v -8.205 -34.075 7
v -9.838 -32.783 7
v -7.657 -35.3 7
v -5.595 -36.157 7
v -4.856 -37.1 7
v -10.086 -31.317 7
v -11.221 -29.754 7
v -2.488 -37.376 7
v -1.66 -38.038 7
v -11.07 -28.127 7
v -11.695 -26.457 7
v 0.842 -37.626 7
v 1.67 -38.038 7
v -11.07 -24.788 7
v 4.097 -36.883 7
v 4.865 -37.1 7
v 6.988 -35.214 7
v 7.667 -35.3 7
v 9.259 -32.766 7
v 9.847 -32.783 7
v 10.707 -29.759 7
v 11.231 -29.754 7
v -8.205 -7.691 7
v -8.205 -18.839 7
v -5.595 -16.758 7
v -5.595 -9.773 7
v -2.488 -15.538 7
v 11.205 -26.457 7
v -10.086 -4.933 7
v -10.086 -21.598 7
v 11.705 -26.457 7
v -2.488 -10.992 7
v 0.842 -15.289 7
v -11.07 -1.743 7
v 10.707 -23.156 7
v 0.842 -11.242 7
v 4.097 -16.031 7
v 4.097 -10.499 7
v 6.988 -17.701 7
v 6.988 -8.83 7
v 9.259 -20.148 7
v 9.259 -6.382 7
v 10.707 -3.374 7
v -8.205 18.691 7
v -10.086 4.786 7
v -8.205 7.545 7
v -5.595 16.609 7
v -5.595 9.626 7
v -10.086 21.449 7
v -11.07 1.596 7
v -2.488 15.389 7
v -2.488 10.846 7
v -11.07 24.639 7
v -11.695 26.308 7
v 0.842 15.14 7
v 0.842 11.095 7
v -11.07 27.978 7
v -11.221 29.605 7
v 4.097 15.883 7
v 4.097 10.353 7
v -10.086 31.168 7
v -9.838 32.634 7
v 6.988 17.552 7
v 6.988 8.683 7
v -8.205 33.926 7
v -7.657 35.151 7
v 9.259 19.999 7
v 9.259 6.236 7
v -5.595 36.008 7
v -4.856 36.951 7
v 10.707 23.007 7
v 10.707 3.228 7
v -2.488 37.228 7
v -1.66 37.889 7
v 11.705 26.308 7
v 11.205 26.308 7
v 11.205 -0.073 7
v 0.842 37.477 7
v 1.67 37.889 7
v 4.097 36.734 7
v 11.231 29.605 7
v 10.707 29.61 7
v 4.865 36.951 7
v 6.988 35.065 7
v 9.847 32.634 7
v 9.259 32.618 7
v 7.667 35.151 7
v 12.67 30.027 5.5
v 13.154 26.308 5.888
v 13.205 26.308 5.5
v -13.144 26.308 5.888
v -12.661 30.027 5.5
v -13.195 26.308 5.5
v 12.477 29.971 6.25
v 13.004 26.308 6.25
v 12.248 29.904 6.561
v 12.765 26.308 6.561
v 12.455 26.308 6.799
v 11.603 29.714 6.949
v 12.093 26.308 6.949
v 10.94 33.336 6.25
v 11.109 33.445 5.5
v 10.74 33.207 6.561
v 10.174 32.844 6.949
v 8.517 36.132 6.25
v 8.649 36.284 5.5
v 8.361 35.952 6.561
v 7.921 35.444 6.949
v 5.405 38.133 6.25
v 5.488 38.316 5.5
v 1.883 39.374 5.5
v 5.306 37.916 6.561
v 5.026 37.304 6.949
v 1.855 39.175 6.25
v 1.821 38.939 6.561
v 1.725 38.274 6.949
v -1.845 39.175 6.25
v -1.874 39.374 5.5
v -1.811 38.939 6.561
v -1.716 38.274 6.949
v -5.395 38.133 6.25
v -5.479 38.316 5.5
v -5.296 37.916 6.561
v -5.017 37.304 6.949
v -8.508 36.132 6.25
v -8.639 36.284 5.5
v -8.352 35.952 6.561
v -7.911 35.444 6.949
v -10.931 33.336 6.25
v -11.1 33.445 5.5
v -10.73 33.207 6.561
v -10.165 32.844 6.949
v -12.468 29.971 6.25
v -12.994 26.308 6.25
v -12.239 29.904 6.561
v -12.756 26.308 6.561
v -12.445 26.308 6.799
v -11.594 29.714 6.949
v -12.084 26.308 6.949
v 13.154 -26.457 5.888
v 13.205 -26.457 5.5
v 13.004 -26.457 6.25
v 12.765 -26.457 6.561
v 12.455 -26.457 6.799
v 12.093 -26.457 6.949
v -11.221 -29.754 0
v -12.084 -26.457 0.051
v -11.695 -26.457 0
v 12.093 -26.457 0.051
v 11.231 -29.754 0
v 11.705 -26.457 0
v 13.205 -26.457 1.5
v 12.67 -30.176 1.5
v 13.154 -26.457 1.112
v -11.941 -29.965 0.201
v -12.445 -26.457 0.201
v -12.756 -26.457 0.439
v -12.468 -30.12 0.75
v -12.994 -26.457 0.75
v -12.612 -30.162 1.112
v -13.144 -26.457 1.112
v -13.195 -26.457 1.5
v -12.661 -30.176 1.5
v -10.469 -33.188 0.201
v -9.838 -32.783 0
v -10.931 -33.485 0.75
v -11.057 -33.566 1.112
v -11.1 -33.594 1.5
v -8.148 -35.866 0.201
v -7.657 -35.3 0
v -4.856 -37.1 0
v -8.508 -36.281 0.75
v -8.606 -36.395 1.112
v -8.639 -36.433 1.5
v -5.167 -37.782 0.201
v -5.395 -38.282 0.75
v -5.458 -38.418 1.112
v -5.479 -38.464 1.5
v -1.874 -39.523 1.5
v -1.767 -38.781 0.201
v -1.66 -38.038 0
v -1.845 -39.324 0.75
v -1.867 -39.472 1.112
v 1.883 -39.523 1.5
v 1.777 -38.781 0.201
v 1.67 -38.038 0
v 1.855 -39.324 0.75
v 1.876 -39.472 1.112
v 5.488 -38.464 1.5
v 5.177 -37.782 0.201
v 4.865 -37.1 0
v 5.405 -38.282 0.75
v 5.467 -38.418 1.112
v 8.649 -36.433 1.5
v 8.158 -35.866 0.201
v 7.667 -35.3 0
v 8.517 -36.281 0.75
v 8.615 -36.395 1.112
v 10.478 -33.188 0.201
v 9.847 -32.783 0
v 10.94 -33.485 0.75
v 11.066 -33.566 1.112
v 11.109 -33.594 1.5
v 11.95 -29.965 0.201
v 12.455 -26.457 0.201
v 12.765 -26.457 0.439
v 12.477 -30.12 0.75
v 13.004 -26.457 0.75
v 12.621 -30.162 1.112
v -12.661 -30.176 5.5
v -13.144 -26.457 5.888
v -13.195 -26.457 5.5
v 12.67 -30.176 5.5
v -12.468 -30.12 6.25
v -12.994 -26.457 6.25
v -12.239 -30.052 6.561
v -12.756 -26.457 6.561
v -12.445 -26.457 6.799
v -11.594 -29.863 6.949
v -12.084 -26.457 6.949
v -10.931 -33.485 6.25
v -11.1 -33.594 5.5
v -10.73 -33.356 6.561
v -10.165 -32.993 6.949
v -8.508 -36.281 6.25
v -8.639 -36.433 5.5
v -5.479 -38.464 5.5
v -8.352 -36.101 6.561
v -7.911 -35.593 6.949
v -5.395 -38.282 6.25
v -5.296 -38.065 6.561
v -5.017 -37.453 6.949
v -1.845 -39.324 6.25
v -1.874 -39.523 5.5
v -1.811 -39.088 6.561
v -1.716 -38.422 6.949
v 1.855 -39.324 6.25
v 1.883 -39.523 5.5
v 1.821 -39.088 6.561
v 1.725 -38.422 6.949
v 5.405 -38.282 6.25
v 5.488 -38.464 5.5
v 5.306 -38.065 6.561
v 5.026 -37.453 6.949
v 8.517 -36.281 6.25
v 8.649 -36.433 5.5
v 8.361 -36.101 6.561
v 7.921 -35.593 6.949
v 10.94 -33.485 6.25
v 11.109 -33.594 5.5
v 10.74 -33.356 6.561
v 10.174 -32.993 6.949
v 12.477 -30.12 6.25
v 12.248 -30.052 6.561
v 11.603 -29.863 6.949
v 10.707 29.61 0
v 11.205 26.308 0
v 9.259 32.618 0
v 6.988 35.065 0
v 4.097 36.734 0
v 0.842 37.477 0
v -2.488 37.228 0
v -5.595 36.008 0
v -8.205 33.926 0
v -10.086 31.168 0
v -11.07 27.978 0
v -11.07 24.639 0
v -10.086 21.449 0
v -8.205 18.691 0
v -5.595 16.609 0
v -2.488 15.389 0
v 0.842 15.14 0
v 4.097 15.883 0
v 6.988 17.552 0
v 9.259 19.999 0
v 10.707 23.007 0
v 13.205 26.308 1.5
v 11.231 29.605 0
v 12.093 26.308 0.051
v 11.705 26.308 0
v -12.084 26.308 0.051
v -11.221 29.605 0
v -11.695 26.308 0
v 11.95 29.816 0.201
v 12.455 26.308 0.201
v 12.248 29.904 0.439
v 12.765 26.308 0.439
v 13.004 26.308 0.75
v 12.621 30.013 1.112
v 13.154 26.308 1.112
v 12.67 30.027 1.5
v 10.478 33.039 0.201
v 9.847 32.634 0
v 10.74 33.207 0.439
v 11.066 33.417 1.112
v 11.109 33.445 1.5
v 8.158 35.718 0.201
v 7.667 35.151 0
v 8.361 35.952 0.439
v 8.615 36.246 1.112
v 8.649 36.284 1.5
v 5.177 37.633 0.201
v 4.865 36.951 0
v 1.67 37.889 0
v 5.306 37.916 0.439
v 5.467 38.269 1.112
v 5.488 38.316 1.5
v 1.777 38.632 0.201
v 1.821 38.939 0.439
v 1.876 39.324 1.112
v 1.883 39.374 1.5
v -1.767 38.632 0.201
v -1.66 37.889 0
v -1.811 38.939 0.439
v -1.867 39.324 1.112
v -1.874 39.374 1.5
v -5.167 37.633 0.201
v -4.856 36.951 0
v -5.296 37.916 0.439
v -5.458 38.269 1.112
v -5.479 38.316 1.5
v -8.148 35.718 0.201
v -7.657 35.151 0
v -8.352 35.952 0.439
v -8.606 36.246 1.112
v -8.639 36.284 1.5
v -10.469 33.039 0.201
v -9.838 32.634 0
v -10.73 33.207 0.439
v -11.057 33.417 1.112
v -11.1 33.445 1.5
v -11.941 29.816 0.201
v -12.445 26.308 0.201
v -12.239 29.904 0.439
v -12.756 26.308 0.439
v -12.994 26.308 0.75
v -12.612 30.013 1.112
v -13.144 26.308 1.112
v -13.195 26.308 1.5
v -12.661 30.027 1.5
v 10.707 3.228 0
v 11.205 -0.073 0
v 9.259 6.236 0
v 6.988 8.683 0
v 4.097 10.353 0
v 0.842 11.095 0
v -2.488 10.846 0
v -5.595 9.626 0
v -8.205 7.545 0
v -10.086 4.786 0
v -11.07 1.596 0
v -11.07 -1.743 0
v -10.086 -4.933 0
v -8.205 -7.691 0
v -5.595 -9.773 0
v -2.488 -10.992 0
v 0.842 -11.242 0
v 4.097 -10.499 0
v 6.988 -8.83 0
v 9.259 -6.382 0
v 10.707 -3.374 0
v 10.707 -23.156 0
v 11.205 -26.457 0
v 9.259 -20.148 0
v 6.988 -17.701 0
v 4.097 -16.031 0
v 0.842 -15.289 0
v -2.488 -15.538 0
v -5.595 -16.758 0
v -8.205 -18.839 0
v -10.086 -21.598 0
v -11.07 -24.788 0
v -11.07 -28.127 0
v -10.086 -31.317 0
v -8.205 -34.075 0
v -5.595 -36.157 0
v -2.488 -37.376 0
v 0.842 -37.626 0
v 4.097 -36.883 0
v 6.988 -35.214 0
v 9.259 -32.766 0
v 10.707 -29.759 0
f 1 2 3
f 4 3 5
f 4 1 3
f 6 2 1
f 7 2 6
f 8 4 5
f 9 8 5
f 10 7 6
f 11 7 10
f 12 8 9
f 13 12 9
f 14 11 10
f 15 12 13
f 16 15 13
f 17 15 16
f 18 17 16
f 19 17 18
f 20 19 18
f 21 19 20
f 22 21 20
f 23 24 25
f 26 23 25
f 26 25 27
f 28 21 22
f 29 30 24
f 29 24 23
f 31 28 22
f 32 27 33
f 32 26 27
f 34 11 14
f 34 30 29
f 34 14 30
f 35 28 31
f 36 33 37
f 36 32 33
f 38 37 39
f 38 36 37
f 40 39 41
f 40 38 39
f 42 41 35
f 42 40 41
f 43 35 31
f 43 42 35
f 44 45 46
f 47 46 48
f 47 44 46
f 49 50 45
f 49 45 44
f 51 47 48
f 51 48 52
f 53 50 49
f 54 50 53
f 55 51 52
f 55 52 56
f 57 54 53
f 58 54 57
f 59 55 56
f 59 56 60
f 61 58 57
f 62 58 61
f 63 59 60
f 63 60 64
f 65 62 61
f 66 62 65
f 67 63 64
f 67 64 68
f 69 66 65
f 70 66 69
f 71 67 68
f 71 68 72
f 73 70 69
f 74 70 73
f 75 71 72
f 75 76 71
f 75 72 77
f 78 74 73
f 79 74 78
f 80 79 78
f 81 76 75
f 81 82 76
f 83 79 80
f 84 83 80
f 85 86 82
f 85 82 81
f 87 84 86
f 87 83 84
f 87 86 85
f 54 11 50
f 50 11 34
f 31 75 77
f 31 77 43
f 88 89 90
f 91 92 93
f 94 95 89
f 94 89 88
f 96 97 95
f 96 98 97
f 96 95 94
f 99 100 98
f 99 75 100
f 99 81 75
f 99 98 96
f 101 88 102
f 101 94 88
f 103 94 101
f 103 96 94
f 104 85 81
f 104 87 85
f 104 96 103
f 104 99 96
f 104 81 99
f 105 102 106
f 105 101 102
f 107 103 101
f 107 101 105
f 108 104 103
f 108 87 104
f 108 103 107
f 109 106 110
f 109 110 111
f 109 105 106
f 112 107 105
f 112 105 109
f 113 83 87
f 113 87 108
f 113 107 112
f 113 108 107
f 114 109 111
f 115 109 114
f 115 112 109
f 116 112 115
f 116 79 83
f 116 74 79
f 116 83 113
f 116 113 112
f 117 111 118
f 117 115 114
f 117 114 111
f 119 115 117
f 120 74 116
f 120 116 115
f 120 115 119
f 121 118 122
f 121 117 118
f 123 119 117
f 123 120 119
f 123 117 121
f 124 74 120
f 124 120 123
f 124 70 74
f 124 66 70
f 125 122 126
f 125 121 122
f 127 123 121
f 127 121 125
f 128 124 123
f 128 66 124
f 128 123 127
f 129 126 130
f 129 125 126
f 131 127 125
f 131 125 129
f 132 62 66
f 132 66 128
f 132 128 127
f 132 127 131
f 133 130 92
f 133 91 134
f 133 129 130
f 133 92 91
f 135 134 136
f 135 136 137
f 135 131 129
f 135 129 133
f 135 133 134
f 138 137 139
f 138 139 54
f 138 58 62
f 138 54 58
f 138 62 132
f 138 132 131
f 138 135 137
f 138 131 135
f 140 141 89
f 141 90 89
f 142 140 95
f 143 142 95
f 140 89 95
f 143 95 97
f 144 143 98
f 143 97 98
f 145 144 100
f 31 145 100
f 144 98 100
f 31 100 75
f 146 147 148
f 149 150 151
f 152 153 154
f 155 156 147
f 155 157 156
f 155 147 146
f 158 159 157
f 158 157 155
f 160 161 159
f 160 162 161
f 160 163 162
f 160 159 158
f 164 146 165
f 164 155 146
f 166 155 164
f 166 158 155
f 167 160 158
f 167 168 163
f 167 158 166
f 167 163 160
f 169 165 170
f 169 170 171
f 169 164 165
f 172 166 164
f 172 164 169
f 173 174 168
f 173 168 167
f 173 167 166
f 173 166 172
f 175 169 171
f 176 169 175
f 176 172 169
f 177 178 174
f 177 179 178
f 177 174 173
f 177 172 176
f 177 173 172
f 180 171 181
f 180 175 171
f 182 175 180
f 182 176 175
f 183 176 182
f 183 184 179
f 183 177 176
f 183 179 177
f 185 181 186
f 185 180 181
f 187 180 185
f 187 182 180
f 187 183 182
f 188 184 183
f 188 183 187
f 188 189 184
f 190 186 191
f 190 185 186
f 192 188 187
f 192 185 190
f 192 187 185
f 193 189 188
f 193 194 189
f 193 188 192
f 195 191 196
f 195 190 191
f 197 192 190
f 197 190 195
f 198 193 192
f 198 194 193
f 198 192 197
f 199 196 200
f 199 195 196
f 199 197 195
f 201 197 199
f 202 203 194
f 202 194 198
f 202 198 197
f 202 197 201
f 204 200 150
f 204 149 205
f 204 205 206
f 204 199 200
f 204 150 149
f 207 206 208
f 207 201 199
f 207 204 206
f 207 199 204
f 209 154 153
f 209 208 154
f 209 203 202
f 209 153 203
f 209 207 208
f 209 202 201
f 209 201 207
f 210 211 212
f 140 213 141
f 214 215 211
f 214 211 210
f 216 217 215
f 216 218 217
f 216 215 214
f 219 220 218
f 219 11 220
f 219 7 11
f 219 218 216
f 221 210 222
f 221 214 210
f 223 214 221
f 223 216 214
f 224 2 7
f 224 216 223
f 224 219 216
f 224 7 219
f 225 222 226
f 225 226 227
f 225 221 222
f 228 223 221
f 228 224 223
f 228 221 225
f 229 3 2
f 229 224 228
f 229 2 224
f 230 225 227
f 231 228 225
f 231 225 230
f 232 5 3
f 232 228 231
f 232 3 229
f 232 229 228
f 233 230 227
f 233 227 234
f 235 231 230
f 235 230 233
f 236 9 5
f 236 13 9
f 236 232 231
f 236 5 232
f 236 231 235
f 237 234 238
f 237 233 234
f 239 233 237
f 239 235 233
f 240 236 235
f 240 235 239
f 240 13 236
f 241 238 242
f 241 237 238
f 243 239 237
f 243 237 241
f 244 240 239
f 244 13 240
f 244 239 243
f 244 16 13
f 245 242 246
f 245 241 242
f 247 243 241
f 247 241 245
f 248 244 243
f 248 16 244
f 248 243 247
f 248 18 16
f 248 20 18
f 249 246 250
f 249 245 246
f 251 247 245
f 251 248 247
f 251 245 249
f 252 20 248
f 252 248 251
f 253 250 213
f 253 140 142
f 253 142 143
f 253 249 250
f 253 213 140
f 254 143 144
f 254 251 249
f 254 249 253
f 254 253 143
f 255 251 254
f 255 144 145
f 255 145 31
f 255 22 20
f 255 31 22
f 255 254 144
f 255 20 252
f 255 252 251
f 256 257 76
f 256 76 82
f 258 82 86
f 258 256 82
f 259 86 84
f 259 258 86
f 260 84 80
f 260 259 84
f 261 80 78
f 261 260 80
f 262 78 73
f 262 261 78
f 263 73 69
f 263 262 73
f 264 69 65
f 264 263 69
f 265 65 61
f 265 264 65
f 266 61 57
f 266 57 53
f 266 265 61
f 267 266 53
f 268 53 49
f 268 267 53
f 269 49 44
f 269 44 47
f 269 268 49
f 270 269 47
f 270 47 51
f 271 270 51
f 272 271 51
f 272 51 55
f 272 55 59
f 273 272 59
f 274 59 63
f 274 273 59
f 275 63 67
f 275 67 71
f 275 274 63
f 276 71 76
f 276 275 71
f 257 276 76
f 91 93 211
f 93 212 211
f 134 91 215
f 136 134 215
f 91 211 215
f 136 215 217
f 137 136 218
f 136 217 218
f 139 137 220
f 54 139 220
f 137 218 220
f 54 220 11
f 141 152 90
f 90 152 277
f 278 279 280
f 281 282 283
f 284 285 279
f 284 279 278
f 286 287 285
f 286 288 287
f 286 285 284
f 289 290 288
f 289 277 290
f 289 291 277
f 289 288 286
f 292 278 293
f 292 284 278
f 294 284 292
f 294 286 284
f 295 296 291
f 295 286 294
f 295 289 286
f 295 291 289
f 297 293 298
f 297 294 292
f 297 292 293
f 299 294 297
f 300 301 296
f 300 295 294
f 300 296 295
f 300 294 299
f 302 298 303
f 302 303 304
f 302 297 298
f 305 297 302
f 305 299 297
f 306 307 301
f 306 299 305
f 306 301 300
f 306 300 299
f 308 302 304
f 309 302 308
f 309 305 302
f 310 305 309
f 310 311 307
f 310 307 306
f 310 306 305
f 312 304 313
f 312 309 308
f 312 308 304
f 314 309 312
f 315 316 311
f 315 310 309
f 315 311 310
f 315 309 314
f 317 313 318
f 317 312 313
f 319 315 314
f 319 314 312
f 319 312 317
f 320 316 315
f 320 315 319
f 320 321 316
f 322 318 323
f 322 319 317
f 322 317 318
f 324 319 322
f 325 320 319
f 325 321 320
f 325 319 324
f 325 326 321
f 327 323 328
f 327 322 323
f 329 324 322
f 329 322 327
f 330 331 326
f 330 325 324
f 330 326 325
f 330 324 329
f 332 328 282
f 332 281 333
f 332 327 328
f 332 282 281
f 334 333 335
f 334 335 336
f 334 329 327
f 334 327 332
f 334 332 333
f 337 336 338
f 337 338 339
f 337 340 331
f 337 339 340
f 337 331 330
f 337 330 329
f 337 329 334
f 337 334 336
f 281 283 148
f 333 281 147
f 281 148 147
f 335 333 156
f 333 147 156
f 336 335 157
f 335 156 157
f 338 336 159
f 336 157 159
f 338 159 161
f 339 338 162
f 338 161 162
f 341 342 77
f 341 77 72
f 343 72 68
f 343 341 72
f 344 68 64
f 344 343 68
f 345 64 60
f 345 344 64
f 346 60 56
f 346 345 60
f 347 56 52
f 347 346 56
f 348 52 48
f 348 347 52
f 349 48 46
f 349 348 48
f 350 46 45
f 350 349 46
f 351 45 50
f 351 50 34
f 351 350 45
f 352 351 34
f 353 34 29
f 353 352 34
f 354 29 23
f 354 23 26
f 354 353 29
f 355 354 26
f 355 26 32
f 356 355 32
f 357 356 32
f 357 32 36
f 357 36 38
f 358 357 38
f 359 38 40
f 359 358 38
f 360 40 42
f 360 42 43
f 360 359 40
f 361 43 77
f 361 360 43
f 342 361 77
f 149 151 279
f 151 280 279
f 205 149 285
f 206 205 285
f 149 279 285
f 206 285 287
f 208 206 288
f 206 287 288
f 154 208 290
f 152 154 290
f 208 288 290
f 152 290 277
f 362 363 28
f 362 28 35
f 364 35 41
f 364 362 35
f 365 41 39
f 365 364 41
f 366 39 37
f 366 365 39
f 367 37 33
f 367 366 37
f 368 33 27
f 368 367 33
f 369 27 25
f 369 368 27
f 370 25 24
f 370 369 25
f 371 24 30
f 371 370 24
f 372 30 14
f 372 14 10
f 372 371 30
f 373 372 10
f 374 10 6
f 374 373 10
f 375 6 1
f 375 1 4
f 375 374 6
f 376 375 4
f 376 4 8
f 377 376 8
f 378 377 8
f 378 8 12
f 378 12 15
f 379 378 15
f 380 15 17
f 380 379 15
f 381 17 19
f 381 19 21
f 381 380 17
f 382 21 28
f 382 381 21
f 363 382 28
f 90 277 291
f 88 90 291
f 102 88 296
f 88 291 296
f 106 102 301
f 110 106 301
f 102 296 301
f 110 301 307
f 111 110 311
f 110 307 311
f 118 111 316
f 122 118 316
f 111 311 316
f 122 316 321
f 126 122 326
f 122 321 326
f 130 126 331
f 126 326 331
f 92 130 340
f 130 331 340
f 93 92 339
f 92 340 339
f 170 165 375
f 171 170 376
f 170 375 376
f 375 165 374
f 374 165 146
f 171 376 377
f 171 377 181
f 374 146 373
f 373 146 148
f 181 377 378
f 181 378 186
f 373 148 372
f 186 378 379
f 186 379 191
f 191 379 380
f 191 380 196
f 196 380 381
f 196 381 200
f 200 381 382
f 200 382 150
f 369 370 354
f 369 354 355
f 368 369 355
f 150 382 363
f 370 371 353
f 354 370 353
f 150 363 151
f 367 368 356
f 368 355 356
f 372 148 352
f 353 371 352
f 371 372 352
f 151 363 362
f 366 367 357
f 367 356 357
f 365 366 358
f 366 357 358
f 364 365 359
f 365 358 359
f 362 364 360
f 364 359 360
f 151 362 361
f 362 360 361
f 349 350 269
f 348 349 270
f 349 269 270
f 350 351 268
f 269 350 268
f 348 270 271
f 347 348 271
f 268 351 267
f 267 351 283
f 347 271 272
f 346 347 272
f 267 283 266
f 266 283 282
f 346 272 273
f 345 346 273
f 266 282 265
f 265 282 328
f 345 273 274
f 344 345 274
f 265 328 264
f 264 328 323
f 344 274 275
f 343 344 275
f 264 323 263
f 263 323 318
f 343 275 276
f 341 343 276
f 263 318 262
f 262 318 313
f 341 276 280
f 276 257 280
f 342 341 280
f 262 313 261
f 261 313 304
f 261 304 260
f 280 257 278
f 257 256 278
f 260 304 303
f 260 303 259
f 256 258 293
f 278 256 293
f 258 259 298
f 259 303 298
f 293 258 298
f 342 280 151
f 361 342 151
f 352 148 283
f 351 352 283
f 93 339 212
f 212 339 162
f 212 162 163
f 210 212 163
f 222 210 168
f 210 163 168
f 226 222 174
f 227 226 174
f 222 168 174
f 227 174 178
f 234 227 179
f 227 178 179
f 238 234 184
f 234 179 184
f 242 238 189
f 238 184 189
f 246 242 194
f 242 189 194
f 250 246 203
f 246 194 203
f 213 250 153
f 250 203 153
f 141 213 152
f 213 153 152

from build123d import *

# Parameters (mm, degrees)
F0_R     = 11.2
F1_DEPTH = 7
F2_R     = 1.5
F3_R     = 1.5


with BuildPart() as f1:
    # F0 (on Top) → F1 (new body)
    with BuildSketch(Plane.XY):
        with BuildLine():
            Line((-13.195308, 26.308456), (-13.195308, -26.457274))
            ThreePointArc((-13.195308, -26.457274), (0.004692, -39.657274), (13.204692, -26.457274))
            Line((13.204692, -26.457274), (13.204692, 26.308456))
            ThreePointArc((13.204692, 26.308456), (0.004692, 39.508456), (-13.195308, 26.308456))
        make_face()
        with Locations((0.004692, -26.457274)):
            Circle(F0_R, mode=Mode.SUBTRACT)
        with Locations((0.004692, 26.308456)):
            Circle(F0_R, mode=Mode.SUBTRACT)
        with Locations((0.004719, -0.073227)):
            Circle(F0_R, mode=Mode.SUBTRACT)
    extrude(amount=F1_DEPTH)

    # F2
    f2_edges = [f1.edges().sort_by_distance(p)[0] for p in [
        (-13.195308, -0.074409, 7),
        (0.004692, 39.508456, 7),
        (13.204692, -0.074409, 7),
        (0.004692, -39.657274, 7),
    ]]
    fillet(f2_edges, radius=F2_R)

    # F3
    f3_edges = [f1.edges().sort_by_distance(p)[0] for p in [
        (13.204692, -0.074409, 0),
        (0.004692, 39.508456, 0),
        (-13.195308, -0.074409, 0),
        (0.004692, -39.657274, 0),
    ]]
    fillet(f3_edges, radius=F3_R)


solid = f1.part
